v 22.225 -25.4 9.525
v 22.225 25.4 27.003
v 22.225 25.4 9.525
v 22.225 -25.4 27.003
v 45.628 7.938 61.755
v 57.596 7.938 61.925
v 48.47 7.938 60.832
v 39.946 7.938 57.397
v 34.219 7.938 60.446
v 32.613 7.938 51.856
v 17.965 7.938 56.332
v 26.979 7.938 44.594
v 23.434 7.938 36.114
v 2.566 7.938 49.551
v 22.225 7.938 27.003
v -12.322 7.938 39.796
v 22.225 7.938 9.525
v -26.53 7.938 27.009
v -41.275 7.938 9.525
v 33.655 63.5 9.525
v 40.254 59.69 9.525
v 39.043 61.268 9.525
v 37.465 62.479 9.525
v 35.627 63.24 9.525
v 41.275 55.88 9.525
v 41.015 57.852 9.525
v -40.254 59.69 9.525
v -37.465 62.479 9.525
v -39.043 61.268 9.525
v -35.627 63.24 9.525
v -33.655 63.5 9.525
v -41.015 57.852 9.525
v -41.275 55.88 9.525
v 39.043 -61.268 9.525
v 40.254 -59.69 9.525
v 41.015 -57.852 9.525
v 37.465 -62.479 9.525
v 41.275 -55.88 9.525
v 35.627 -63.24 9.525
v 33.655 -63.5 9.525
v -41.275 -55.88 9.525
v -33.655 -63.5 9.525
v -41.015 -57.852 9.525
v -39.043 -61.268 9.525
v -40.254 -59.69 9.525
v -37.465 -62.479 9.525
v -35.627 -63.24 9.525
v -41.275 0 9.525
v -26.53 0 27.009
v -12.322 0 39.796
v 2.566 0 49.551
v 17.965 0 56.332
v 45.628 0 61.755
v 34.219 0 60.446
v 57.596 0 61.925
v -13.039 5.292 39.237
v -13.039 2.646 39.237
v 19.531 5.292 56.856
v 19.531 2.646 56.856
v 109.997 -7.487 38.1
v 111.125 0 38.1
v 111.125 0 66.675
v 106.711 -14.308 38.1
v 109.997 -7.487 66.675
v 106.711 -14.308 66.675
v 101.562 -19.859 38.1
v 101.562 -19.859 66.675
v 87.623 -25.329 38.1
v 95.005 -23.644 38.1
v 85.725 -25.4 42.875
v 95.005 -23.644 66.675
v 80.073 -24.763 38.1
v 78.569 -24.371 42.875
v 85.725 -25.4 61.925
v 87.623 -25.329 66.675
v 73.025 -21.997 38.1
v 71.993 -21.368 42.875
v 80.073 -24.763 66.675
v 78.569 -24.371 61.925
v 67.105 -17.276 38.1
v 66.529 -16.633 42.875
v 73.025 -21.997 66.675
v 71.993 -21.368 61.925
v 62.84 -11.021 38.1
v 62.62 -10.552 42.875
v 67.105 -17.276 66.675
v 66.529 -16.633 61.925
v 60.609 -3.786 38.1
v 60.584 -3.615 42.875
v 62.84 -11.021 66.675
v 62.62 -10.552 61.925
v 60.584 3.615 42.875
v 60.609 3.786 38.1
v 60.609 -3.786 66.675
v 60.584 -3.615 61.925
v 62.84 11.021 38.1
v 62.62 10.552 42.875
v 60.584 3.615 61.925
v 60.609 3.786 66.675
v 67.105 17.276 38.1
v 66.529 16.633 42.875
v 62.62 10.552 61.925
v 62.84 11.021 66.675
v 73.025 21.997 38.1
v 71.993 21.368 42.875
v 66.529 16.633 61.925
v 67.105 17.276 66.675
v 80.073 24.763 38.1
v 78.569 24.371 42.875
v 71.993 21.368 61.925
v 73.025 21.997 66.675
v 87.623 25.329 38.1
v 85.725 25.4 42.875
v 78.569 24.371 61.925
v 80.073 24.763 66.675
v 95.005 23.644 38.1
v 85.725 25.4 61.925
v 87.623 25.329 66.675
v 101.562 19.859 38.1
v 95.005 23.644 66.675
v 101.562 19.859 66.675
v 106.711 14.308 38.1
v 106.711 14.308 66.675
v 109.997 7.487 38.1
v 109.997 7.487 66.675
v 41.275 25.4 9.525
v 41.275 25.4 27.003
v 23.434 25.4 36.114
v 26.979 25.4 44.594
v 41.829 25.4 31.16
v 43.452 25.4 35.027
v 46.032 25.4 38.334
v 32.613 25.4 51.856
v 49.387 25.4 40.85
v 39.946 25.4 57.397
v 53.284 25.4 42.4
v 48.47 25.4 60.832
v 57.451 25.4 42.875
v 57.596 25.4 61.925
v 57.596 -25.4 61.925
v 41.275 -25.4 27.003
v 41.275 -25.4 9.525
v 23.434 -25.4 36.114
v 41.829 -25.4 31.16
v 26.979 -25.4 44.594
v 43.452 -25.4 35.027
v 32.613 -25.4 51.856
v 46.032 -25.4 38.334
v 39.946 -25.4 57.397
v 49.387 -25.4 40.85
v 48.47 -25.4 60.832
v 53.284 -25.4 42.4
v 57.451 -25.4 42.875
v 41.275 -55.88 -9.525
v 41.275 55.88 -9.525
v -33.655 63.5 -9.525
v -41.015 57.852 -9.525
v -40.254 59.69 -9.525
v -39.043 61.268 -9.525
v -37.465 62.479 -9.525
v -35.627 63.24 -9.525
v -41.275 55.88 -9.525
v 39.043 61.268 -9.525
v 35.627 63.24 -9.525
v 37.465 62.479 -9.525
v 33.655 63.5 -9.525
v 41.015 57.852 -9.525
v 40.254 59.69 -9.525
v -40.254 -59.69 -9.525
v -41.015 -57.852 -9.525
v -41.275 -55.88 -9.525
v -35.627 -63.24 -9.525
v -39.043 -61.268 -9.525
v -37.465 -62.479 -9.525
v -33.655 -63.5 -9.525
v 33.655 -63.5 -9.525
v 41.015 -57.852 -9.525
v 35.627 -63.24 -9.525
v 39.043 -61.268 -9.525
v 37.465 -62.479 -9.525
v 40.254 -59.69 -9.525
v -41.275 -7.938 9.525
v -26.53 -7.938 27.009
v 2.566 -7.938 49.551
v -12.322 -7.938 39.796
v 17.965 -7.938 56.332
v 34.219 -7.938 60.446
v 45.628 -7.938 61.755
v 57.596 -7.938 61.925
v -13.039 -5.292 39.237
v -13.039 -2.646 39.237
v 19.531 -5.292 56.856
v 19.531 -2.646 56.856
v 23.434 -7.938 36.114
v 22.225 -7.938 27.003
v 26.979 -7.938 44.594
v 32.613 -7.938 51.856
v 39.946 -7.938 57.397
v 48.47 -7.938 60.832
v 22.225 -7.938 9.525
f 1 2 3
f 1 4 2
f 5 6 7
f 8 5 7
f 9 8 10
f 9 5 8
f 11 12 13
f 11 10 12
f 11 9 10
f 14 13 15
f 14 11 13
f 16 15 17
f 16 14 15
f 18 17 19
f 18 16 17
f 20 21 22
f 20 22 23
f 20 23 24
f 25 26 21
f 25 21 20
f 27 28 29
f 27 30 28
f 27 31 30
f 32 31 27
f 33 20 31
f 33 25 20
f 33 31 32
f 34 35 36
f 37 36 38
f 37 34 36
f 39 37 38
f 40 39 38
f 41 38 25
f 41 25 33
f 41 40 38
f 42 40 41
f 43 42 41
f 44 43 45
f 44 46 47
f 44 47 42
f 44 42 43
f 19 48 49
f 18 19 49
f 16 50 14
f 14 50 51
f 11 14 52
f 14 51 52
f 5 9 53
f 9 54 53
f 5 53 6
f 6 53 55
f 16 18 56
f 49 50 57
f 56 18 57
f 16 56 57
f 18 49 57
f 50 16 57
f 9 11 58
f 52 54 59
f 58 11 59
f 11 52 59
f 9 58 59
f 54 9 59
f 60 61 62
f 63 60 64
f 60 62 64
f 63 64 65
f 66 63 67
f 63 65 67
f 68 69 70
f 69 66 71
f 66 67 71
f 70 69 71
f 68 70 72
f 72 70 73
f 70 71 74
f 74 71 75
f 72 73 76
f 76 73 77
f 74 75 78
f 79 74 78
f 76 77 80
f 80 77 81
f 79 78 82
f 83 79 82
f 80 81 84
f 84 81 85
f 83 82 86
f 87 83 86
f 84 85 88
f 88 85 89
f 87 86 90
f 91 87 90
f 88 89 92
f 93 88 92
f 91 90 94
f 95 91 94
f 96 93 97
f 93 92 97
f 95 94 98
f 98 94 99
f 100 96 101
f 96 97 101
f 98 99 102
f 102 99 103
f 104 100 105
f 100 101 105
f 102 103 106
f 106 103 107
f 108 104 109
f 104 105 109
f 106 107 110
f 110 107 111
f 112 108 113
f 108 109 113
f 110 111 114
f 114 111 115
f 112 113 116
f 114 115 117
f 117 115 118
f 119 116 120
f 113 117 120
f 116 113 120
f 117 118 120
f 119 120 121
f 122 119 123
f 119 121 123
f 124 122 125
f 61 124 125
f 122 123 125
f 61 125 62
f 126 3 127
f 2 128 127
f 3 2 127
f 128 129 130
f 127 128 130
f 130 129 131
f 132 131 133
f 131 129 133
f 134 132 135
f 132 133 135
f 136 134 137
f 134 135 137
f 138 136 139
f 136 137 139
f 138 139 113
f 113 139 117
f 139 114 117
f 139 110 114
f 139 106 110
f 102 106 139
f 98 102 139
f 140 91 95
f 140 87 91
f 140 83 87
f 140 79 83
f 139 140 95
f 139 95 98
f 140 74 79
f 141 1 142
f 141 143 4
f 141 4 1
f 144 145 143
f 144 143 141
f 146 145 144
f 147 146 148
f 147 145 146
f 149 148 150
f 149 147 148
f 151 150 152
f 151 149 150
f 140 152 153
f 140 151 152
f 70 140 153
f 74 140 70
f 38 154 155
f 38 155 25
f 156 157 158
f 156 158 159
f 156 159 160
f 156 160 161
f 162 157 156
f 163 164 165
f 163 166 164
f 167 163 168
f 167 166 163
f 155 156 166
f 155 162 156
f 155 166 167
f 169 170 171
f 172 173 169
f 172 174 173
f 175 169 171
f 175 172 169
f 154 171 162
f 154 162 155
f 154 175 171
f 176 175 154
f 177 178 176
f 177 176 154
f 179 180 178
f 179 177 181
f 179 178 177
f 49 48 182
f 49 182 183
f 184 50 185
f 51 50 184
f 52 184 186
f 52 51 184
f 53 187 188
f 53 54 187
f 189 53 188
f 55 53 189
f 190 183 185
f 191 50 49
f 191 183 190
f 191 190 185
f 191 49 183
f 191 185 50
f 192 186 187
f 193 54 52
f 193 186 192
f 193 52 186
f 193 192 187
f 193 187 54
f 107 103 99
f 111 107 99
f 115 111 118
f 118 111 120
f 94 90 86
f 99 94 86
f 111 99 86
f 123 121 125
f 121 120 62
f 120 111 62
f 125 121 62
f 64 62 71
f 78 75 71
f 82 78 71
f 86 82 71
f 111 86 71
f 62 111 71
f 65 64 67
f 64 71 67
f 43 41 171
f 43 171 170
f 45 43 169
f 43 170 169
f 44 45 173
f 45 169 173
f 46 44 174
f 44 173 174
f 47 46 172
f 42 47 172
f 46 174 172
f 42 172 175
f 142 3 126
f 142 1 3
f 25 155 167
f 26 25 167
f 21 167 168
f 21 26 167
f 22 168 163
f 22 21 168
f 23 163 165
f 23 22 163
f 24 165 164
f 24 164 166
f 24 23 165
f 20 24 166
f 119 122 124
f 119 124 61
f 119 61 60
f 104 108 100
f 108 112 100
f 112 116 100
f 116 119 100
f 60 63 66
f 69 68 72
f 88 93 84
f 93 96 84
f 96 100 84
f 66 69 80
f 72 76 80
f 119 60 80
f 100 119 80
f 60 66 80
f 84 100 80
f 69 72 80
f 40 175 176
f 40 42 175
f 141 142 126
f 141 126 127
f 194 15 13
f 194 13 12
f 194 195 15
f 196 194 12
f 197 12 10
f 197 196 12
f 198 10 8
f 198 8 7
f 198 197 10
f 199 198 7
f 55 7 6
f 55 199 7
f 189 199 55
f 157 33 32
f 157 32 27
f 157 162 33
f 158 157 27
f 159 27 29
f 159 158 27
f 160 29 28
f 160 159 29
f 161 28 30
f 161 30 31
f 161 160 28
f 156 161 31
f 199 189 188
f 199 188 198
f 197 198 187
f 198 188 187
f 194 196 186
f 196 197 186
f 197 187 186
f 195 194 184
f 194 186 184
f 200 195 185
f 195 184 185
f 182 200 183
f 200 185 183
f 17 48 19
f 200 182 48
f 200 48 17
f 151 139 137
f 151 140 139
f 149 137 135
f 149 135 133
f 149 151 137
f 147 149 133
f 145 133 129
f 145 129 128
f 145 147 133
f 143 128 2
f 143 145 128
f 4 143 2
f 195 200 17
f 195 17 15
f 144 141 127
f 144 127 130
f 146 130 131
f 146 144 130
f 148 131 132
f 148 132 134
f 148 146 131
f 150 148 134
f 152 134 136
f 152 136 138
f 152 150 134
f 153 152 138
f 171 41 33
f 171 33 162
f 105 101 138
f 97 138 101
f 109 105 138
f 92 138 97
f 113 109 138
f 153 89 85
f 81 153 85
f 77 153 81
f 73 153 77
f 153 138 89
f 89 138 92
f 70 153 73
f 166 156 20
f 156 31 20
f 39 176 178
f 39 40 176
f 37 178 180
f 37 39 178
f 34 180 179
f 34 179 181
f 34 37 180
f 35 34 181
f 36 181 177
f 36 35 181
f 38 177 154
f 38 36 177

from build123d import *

# Parameters (mm, degrees)
F1_DEPTH = 63.5
F0_W     = 25.4
F0_H     = 19.05
F2_DEPTH = 25.4
F3_DEPTH = 7.9375
F5_R     = 7.62


with BuildPart() as f1:
    # F0 (on Front) → F1 (new body, symmetric)
    with BuildSketch(Plane.XZ):
        Polygon((-41.275, -9.525), (41.275, -9.525), (41.275, 9.525), (22.225, 9.525), (-41.275, 9.525), align=None)
    extrude(amount=F1_DEPTH, both=True)

    # F5
    f5_edges = [f1.edges().sort_by_distance(p)[0] for p in [
        (-41.275, -63.5, 0),
        (41.275, -63.5, 0),
        (41.275, 63.5, 0),
        (-41.275, 63.5, 0),
    ]]
    fillet(f5_edges, radius=F5_R)


with BuildPart() as f2:
    # F0 (on Front) → F2 (new body, symmetric)
    with BuildSketch(Plane.XZ):
        with BuildLine():
            Line((22.225, 9.525), (41.275, 9.525))
            Line((41.275, 9.525), (41.275, 27.0030498541))
            ThreePointArc((41.275, 27.0030498541), (46.031533816, 38.3342163746), (57.4507902004, 42.8752))
            Line((57.4507902004, 42.8752), (60.325, 42.8752))
            Line((60.325, 42.8752), (60.325, 61.9252))
            Line((60.325, 61.9252), (57.5961548882, 61.9252))
            ThreePointArc((57.5961548882, 61.9252), (32.6125422514, 51.8559931855), (22.225, 27.0030498541))
            Line((22.225, 27.0030498541), (22.225, 9.525))
        make_face()
        with Locations((73.025, 52.4002)):
            Rectangle(F0_W, F0_H)
    extrude(amount=F2_DEPTH, both=True)

    # F0 (on Front) → F4 (revolve)
    with BuildSketch(Plane.XZ):
        Polygon((85.725, 66.675), (85.725, 61.9252), (85.725, 42.8752), (85.725, 38.1), (111.125, 38.1), (111.125, 66.675), align=None)
    revolve(axis=Axis((85.725, 0, 52.3875), (0, 0, -1)))


with BuildPart() as f3:
    # F0 (on Front) → F3 (new body, symmetric)
    with BuildSketch(Plane.XZ):
        with BuildLine():
            add(Edge.make_bspline(
                [(-41.275, 9.525), (-14.8186832666, 45.1327413321), (16.3958929479, 63.2817000151), (57.5961548882, 61.9252)],
                knots=[0, 0, 0, 0, 111.8985532926, 111.8985532926, 111.8985532926, 111.8985532926], degree=3))
            Line((-41.275, 9.525), (22.225, 9.525))
            Line((22.225, 9.525), (22.225, 27.0030498541))
            ThreePointArc((22.225, 27.0030498541), (32.6125422514, 51.8559931855), (57.5961548882, 61.9252))
        make_face()
    extrude(amount=F3_DEPTH, both=True)


solid = Compound([f1.part, f2.part, f3.part])
